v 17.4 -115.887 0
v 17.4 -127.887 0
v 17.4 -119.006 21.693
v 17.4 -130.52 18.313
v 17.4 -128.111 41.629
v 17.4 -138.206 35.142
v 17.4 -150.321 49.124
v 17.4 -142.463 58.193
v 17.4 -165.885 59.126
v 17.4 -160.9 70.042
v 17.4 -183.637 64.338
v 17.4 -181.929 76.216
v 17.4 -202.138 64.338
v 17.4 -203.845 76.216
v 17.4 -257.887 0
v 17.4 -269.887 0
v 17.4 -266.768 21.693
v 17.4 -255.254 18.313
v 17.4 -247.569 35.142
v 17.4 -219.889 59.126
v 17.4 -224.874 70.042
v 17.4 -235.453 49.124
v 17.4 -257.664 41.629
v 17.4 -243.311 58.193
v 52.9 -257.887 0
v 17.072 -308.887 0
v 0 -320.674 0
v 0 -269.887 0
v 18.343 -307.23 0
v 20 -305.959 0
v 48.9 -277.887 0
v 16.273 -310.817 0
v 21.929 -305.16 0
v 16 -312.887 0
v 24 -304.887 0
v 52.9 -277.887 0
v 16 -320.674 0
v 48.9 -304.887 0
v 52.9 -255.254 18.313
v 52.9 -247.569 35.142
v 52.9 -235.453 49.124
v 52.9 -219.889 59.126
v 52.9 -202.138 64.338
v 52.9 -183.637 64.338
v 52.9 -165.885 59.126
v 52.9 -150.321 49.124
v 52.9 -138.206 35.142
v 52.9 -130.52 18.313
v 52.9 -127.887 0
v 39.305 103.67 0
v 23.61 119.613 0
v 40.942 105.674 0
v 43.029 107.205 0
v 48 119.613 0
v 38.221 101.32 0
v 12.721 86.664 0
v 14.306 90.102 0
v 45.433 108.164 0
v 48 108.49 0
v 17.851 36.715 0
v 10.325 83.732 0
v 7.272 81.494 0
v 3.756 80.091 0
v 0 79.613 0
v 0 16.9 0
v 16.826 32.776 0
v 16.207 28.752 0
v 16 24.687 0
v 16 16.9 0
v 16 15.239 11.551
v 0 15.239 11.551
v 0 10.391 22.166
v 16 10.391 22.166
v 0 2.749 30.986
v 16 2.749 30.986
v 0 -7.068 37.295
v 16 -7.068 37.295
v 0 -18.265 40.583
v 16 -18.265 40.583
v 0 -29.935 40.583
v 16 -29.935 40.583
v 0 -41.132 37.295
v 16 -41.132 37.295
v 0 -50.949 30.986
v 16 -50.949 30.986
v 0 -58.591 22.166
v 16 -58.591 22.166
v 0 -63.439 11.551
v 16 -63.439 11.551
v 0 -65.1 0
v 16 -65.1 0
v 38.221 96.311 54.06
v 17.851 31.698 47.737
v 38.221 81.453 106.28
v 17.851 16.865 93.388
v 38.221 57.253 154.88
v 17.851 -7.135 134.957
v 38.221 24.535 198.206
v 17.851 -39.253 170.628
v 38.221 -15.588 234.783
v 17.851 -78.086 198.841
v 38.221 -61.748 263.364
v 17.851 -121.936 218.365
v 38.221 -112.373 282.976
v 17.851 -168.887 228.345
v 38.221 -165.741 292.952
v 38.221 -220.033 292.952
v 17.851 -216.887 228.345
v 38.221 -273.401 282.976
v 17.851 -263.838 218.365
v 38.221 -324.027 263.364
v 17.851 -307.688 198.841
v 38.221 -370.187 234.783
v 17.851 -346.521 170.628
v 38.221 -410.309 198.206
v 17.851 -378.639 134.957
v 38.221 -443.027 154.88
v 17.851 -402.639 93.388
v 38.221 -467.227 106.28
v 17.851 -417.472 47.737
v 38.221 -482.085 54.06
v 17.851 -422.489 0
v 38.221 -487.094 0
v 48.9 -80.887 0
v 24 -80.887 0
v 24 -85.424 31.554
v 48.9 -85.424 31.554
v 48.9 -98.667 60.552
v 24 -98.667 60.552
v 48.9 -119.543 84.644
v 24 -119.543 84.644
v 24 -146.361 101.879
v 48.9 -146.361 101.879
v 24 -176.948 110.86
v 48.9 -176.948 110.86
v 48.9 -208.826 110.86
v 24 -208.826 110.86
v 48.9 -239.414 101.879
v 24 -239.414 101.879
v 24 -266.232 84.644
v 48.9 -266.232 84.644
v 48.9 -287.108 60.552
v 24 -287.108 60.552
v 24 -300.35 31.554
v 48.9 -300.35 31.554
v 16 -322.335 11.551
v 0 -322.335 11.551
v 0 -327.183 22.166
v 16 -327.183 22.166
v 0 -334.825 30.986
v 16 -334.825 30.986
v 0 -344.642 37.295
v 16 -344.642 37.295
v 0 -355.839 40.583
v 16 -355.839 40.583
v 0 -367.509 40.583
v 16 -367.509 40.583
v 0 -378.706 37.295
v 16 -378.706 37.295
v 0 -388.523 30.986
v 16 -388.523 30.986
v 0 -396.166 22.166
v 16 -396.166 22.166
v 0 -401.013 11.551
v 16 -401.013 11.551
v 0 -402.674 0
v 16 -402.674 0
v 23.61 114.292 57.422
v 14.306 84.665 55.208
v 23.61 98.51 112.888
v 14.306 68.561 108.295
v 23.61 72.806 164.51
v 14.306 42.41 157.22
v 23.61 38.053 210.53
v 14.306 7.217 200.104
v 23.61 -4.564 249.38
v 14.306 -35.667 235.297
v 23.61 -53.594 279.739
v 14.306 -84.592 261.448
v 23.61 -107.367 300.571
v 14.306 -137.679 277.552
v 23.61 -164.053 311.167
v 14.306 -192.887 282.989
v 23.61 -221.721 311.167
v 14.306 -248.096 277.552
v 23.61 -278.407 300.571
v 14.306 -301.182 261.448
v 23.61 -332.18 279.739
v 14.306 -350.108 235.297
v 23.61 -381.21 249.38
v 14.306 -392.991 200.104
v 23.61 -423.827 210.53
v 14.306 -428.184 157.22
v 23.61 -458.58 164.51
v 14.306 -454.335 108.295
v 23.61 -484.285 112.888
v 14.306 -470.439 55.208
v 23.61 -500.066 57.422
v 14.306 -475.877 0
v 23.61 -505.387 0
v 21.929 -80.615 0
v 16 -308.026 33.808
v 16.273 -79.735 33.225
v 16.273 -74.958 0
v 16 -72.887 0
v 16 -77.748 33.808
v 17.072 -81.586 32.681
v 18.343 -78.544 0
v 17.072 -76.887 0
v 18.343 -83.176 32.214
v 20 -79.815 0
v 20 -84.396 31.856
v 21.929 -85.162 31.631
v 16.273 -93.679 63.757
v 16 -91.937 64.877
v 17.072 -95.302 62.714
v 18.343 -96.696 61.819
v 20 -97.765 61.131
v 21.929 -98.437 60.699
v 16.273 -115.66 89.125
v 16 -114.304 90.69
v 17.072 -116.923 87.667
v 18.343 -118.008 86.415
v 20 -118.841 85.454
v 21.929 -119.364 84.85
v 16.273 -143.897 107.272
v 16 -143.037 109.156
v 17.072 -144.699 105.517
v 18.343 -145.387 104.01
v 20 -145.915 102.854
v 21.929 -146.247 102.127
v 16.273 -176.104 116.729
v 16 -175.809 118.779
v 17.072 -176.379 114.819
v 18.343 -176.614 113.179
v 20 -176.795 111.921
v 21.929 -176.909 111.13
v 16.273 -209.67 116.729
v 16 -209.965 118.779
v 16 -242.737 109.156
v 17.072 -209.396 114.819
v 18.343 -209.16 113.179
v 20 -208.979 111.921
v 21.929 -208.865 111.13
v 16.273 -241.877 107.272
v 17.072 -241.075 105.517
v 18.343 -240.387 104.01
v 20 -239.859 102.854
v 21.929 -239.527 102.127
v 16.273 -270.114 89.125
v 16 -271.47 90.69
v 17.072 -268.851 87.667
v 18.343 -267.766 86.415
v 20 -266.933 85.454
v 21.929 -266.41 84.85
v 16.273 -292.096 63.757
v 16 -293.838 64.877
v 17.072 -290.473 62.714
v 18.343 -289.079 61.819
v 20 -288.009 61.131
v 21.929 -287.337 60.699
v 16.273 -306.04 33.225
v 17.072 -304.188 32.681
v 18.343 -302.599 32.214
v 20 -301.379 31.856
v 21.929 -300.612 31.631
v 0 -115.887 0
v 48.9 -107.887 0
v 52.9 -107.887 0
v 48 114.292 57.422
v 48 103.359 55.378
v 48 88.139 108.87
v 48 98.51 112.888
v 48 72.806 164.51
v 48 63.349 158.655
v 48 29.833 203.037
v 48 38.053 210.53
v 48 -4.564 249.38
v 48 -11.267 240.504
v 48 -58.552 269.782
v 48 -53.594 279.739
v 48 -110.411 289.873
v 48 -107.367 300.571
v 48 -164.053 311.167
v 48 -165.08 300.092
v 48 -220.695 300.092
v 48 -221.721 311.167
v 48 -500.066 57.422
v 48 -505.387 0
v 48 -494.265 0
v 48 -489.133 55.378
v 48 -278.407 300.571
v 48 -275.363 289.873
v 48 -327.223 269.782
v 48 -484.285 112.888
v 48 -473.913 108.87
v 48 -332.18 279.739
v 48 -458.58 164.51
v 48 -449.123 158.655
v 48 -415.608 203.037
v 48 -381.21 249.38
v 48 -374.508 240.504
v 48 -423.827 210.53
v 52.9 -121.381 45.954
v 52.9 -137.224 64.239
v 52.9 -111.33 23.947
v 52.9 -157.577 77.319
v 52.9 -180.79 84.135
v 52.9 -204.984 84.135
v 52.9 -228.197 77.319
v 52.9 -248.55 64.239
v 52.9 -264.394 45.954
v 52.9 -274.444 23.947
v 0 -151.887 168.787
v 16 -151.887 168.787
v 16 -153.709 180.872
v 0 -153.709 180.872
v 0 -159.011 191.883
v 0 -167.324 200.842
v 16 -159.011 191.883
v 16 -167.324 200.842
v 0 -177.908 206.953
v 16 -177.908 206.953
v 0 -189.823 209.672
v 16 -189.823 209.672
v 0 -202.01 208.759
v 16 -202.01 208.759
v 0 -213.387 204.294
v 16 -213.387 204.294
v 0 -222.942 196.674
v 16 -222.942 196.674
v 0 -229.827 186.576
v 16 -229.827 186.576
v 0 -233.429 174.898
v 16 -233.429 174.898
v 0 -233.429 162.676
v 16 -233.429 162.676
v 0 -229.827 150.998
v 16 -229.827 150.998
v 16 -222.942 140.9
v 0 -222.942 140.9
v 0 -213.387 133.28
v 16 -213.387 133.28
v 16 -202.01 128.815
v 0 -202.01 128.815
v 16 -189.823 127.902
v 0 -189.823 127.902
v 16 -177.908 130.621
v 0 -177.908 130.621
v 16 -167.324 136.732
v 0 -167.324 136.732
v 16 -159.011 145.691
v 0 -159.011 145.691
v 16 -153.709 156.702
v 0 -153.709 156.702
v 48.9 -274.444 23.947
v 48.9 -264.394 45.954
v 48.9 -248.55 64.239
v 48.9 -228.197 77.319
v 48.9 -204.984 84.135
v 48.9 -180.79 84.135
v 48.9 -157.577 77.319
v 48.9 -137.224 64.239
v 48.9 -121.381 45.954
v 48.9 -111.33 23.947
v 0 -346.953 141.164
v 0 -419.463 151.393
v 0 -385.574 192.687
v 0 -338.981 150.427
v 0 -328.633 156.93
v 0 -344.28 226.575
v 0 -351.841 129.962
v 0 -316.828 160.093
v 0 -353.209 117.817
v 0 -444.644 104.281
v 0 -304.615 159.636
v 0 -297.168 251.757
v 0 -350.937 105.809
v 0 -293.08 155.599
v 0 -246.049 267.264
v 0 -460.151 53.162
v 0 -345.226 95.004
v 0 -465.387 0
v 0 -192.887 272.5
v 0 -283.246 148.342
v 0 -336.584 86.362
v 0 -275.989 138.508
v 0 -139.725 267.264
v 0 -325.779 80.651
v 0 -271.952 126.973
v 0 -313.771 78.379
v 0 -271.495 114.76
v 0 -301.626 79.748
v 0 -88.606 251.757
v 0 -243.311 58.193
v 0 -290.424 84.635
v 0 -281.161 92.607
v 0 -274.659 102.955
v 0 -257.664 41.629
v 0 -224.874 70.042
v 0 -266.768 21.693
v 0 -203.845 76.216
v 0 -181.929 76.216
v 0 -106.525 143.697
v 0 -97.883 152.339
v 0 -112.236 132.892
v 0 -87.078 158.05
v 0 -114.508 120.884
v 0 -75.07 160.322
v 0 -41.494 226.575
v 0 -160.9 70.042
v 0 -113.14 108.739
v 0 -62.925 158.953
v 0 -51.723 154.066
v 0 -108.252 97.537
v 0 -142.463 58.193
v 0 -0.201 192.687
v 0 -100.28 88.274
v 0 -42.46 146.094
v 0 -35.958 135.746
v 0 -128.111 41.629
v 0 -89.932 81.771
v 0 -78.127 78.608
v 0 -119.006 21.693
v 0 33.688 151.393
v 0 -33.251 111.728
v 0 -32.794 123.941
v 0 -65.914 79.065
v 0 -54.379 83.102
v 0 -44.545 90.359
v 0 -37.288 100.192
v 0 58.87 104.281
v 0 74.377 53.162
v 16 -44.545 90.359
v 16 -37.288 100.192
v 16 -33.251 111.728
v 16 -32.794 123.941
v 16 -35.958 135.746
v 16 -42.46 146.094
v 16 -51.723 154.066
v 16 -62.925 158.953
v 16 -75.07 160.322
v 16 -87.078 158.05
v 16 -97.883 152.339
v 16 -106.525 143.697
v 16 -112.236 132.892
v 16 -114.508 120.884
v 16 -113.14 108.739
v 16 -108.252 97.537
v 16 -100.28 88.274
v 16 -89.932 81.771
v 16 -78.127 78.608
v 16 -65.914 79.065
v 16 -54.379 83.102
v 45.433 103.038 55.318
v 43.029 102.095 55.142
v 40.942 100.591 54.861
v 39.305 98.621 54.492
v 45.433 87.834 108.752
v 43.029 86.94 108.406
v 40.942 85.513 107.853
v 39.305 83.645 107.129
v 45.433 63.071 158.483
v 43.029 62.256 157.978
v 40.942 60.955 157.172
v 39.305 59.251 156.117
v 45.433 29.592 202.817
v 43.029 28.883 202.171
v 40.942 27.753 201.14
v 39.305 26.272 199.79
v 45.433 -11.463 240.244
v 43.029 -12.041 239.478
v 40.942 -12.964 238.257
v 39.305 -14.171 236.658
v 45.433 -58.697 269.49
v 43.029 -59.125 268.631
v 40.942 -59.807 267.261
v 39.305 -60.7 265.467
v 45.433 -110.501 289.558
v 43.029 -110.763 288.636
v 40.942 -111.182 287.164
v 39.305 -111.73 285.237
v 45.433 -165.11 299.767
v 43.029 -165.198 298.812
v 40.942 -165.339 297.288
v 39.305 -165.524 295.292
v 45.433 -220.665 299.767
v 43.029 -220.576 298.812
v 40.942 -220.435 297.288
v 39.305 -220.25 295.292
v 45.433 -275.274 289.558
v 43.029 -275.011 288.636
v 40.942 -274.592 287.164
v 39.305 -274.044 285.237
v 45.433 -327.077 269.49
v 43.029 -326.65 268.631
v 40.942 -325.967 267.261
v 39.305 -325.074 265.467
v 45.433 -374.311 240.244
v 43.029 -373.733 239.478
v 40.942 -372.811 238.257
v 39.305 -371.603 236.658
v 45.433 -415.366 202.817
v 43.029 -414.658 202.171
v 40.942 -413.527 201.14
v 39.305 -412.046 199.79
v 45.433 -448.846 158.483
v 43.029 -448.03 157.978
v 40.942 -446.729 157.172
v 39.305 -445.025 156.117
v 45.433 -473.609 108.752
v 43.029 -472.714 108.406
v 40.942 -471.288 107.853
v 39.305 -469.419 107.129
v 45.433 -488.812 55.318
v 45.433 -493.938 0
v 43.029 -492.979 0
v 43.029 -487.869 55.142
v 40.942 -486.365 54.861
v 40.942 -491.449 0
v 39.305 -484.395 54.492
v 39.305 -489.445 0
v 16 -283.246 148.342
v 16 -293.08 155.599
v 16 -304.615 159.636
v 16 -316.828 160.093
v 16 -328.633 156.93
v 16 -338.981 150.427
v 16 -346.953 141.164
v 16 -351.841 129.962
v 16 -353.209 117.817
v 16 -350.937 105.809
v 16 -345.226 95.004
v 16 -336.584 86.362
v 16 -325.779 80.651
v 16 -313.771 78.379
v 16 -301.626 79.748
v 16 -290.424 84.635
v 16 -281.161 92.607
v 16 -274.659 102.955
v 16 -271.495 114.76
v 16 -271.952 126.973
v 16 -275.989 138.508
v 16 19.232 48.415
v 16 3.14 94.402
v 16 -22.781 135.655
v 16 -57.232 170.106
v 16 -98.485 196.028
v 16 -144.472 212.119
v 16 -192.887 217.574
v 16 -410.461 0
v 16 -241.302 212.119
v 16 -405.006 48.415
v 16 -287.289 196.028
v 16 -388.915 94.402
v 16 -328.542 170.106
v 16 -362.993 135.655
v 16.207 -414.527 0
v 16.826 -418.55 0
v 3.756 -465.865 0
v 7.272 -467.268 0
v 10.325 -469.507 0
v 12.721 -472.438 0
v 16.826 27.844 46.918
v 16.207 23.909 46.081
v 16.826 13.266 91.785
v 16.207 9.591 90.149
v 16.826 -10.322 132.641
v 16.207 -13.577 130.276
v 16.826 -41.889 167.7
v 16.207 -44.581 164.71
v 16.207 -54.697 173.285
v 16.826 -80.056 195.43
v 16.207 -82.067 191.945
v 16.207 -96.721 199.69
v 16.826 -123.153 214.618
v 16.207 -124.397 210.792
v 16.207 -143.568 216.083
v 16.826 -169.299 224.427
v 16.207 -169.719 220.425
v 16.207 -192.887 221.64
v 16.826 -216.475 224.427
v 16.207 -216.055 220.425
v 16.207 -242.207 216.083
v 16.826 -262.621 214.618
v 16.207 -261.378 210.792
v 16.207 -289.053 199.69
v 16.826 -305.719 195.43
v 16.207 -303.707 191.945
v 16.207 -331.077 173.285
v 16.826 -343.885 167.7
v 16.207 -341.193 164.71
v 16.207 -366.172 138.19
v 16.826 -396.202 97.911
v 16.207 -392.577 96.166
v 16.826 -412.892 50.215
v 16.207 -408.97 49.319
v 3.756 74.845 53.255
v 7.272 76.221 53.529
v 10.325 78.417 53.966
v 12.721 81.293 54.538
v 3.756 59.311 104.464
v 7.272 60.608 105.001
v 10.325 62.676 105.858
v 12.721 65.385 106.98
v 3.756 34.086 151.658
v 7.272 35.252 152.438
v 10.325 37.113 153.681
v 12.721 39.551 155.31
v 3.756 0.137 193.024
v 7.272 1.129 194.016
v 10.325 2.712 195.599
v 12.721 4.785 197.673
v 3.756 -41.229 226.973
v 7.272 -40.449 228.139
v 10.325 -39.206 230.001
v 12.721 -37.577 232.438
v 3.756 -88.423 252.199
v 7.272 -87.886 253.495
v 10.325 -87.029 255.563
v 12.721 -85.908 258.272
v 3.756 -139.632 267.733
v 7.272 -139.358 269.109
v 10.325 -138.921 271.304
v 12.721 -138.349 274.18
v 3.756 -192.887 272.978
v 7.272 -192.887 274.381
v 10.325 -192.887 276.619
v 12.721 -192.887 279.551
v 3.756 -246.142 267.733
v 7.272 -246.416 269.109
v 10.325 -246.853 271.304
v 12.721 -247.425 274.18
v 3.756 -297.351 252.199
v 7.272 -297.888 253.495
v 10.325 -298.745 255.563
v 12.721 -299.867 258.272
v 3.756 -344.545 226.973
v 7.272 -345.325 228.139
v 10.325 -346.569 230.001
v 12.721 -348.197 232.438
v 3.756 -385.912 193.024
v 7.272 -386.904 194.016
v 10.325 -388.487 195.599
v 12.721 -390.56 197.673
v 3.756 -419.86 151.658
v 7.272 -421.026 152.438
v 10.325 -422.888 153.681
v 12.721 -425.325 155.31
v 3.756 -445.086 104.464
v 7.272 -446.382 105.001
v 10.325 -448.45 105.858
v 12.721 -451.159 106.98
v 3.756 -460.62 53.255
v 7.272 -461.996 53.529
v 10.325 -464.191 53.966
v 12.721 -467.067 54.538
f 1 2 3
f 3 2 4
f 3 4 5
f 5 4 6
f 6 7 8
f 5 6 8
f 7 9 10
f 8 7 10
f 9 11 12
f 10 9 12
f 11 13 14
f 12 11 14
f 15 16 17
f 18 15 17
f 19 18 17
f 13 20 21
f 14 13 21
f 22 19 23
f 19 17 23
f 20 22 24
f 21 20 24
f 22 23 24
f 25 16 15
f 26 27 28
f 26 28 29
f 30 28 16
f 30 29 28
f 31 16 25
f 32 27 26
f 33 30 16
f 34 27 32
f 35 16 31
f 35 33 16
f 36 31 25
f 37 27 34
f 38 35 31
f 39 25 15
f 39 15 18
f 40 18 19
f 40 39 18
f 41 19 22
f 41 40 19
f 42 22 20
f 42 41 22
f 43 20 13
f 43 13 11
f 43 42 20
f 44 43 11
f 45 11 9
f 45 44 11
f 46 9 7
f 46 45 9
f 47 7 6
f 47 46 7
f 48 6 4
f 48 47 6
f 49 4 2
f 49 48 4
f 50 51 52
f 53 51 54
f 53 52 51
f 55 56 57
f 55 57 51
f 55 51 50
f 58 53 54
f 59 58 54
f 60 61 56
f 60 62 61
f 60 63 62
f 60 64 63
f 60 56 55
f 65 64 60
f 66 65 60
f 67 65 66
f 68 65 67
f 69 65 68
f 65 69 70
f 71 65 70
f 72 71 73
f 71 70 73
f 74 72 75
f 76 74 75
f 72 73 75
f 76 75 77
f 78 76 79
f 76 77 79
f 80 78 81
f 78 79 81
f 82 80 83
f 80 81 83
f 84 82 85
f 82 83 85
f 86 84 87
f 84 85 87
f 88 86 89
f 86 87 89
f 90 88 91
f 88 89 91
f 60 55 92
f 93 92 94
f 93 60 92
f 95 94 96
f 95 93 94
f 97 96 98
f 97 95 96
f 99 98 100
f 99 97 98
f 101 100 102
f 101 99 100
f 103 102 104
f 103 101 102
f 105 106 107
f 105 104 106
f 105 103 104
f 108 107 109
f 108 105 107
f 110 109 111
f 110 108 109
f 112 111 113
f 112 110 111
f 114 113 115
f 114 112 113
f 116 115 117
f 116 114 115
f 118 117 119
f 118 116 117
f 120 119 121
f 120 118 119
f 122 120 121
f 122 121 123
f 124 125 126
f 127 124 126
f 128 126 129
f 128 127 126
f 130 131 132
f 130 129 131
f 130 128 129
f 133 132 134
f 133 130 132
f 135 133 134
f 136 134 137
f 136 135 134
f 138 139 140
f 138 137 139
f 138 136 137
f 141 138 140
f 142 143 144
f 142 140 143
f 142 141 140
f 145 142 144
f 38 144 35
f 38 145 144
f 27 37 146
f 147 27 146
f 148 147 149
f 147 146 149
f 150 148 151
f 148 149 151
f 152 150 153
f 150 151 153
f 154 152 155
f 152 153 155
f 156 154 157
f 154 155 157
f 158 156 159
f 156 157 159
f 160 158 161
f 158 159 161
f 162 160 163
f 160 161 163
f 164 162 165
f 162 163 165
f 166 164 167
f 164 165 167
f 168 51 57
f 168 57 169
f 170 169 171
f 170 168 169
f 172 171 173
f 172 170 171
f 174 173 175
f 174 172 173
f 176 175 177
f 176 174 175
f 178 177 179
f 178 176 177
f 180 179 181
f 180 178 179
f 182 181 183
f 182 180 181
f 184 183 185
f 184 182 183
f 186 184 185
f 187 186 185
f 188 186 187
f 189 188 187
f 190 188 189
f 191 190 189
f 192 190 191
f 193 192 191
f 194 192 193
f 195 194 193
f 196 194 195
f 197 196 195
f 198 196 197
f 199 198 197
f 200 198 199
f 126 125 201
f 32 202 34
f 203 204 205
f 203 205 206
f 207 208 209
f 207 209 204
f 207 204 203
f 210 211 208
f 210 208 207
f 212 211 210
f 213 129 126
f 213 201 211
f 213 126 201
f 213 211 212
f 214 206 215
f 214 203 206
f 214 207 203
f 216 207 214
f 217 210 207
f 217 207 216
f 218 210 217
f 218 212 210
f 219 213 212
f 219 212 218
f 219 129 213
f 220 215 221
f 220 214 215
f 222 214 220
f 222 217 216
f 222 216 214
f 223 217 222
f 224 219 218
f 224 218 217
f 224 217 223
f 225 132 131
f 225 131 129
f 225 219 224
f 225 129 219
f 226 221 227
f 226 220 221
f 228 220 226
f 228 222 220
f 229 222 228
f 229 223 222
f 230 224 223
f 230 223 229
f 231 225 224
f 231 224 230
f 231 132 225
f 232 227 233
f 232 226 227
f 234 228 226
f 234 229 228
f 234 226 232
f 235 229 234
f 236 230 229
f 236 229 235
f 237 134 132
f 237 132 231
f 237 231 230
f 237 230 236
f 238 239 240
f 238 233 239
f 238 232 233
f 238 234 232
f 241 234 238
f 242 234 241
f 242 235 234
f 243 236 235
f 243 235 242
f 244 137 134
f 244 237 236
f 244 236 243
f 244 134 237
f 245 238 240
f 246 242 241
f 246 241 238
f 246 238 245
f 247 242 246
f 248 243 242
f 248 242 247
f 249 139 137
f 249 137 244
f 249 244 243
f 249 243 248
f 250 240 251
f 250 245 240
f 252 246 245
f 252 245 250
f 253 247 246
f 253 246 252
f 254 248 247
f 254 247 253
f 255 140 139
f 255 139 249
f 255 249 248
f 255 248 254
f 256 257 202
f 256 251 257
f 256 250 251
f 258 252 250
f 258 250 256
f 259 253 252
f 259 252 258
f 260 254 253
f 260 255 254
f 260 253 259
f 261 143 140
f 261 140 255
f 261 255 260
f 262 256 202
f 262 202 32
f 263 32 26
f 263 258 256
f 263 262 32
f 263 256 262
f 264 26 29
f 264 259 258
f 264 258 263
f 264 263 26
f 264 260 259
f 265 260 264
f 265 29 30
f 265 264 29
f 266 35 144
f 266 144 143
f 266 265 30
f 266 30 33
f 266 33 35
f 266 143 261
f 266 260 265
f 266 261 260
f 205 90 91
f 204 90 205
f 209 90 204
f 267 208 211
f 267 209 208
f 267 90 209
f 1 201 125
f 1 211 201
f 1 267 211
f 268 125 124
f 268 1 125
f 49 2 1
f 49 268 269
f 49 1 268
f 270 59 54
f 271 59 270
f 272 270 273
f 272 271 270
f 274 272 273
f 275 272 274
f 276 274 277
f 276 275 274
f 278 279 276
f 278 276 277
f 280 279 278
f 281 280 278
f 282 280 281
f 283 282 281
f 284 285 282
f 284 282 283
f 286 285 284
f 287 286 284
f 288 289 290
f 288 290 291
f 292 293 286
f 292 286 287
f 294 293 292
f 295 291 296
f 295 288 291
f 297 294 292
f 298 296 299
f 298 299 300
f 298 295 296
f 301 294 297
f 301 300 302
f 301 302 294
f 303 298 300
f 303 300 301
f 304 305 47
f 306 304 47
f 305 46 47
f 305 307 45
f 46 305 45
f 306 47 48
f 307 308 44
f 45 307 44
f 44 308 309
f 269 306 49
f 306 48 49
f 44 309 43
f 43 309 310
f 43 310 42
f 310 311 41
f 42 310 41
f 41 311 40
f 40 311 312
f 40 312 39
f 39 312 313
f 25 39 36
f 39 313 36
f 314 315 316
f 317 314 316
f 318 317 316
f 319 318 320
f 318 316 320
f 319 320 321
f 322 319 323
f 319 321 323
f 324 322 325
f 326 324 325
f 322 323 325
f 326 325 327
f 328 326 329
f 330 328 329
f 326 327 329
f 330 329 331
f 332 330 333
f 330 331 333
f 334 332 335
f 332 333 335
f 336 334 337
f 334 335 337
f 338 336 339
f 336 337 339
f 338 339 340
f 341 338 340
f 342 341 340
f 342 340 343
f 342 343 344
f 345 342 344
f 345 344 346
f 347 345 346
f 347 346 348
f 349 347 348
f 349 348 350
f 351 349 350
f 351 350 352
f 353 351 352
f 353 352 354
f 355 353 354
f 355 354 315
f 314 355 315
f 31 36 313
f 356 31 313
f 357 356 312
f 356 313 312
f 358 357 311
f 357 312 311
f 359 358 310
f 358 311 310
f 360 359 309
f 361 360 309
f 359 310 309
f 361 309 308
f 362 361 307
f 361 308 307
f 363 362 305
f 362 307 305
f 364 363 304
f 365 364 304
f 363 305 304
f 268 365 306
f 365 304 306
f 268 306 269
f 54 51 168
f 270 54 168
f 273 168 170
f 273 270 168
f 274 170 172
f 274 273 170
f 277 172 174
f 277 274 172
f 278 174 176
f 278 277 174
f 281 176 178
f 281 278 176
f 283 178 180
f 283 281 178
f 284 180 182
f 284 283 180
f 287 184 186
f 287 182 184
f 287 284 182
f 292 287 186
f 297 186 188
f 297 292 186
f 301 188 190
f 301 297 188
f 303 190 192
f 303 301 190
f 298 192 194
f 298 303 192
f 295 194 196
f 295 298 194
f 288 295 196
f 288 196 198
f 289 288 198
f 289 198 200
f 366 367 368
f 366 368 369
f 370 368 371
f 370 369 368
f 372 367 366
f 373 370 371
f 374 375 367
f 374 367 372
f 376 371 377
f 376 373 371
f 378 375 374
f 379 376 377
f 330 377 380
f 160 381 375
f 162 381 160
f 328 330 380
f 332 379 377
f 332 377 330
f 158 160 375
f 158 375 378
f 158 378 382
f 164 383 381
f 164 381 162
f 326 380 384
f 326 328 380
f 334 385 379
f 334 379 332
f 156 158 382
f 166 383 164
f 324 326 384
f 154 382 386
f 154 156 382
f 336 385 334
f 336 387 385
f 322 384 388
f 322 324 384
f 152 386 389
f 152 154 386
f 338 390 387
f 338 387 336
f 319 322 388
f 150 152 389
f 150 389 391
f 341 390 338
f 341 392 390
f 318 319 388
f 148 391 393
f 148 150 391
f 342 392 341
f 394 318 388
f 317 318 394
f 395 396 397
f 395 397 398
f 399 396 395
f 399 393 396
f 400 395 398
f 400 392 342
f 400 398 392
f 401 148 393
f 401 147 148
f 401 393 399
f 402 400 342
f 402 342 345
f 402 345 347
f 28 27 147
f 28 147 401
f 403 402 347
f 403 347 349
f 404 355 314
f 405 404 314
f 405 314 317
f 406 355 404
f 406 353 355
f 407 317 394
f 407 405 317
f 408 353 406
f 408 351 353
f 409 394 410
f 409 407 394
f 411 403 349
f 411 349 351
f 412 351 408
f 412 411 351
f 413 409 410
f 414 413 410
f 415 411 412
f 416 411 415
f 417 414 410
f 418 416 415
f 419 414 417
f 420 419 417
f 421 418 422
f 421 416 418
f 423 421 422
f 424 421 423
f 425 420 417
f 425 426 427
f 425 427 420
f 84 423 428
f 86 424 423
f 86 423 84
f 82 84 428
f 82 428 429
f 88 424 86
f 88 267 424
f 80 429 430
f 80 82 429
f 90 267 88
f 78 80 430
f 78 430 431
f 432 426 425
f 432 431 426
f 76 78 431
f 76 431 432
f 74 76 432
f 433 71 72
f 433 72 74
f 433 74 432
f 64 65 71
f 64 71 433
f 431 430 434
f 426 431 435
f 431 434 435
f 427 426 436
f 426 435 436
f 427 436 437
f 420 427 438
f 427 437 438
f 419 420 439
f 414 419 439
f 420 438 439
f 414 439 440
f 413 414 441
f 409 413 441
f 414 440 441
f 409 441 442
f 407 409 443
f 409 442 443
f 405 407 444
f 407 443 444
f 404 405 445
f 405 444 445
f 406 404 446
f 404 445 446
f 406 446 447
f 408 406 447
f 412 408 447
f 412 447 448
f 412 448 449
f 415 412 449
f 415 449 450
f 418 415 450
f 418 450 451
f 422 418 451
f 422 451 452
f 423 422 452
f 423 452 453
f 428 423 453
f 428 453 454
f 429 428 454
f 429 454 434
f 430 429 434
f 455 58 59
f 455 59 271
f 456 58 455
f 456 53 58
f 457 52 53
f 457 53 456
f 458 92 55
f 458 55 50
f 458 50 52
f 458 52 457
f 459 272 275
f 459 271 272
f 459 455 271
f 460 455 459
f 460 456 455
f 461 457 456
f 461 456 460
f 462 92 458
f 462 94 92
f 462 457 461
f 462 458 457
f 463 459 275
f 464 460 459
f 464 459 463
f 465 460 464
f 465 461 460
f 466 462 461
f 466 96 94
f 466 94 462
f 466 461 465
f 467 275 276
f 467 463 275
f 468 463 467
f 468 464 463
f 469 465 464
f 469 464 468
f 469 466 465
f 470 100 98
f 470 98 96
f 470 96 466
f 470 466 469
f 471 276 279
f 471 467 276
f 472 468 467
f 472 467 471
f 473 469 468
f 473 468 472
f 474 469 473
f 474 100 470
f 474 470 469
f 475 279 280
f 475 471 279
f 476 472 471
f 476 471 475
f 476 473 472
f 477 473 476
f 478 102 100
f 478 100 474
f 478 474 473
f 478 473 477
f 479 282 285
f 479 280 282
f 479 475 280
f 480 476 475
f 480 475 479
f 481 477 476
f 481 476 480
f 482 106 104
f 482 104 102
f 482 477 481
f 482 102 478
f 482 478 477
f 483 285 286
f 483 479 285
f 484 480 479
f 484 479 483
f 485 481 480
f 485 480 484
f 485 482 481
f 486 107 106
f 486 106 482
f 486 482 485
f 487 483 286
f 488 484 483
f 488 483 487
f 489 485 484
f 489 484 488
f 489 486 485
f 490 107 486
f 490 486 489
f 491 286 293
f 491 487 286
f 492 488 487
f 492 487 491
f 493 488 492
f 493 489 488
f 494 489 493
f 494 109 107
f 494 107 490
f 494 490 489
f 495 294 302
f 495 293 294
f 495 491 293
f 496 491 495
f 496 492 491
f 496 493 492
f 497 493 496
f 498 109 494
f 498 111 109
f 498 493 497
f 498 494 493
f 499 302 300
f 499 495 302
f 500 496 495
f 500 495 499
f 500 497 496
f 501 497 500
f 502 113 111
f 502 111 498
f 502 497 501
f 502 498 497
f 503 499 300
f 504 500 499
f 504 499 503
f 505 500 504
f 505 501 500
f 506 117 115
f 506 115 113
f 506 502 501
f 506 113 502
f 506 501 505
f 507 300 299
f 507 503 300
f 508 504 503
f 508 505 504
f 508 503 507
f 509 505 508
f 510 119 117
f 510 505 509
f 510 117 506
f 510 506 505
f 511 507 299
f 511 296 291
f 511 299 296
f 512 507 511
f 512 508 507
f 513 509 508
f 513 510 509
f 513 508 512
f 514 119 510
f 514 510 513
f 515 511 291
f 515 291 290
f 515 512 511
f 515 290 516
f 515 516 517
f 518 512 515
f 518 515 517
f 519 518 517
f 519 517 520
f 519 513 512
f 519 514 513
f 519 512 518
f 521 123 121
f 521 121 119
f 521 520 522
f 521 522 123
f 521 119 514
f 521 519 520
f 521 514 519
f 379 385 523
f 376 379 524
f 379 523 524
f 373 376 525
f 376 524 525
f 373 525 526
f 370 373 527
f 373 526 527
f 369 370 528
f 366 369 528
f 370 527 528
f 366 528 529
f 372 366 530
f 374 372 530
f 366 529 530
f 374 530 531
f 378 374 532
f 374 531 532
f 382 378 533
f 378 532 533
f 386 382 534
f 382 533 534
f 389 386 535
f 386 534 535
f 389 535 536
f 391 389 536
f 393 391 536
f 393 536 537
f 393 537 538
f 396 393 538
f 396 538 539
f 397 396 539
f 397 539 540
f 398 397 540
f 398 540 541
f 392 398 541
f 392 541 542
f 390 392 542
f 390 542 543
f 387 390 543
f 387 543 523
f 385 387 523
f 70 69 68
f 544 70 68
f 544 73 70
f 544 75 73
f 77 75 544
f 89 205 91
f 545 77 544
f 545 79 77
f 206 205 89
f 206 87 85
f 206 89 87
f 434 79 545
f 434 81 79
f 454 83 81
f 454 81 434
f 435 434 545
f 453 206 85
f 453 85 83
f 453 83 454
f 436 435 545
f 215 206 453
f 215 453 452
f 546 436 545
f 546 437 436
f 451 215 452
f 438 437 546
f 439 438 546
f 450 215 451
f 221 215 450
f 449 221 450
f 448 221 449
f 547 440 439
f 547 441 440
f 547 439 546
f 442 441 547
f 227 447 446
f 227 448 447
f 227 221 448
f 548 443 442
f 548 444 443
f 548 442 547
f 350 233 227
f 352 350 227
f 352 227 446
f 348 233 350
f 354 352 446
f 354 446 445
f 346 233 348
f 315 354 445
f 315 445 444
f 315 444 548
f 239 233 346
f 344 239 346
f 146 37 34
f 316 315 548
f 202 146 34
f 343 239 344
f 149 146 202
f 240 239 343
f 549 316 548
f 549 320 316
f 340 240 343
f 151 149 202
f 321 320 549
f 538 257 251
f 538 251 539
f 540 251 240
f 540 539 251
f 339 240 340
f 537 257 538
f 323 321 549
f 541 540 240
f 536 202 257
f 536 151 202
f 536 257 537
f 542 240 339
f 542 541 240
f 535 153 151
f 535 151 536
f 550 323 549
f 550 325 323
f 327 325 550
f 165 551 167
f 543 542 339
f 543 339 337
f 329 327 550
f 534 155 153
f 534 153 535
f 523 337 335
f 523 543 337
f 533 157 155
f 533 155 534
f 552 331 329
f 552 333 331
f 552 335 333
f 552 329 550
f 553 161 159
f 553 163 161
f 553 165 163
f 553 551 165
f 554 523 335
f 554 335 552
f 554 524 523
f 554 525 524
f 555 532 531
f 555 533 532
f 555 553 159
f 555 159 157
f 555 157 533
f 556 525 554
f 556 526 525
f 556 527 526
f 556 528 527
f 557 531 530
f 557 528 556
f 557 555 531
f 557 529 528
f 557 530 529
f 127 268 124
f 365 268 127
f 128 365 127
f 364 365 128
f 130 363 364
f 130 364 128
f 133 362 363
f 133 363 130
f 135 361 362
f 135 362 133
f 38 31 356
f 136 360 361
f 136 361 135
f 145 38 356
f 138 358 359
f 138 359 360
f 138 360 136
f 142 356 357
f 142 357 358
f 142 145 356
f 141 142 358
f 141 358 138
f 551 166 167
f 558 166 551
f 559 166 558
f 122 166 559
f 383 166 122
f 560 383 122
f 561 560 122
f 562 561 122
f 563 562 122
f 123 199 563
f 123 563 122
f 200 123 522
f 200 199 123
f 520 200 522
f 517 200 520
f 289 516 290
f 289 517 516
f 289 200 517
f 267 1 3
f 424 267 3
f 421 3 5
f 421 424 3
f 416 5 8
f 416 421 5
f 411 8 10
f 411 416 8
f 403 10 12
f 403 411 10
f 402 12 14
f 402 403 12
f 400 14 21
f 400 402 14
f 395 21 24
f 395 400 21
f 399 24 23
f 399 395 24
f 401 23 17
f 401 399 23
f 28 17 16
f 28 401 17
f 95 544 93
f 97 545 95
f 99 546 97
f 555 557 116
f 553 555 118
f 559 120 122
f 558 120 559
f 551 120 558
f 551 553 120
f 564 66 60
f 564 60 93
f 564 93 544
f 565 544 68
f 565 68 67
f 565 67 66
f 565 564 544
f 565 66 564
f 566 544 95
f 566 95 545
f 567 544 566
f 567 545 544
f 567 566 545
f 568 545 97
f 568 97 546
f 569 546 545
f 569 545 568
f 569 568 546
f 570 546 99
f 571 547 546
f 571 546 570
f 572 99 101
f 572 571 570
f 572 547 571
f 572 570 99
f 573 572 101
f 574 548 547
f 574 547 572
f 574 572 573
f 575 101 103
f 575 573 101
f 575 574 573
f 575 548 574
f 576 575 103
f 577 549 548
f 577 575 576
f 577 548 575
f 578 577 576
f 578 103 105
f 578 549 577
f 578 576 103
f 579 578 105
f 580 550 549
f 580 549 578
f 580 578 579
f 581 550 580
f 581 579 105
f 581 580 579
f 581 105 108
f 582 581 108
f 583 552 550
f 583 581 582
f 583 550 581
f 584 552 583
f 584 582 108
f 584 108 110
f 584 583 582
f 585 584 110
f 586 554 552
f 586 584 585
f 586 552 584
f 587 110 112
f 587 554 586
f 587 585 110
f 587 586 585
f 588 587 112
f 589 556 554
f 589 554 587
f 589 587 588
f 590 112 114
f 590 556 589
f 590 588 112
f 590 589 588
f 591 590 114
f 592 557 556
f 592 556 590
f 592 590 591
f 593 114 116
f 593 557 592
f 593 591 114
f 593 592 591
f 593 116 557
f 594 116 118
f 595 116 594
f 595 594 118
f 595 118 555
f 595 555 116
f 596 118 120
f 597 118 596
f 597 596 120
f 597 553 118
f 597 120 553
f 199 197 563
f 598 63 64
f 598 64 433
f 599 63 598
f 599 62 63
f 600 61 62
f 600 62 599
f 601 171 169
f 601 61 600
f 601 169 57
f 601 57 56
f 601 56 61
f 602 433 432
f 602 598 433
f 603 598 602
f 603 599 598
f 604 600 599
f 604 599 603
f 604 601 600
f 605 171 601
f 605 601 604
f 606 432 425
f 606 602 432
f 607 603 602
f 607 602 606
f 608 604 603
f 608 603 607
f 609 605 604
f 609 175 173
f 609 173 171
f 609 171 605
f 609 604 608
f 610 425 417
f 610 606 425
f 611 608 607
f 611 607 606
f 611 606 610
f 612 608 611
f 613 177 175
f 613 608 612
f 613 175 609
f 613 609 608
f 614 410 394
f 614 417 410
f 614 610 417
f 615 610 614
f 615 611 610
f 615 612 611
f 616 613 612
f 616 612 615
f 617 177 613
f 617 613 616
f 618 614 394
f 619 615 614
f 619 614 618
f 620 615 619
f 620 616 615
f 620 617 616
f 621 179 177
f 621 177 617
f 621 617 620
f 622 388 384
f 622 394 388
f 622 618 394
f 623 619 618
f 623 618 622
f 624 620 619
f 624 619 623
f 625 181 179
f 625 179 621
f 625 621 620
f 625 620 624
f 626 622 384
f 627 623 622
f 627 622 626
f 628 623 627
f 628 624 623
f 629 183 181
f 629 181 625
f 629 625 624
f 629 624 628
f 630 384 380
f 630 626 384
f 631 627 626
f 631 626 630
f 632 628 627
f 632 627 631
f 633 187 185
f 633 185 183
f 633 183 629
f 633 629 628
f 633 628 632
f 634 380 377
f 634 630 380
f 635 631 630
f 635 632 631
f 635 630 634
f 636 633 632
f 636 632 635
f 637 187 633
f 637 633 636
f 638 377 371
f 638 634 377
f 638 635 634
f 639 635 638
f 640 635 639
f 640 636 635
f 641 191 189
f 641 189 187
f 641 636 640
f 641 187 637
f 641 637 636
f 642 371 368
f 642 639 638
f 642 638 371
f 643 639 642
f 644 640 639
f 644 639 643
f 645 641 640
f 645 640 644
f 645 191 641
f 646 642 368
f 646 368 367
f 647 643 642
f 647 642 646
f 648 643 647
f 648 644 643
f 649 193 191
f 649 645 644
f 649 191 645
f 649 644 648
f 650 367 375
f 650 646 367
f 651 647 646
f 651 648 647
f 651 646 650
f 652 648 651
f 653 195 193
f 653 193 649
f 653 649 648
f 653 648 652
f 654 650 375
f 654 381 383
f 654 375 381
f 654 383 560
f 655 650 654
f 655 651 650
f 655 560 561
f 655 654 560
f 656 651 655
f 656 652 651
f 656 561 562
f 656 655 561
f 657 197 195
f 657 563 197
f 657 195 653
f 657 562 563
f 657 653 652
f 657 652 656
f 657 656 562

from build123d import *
from build123d.topology import SkipClean

# Parameters (mm, degrees)
FORO_START              = 60
SKETCH2_R               = 41
FORO_DEPTH              = 120
PATTERNFORI_COUNT       = 8
CUT_EXTRUDE1_DEPTH      = 597.549083718
CUT_EXTRUDE1_DEPTH_BACK = 597.549083718
SKETCH4_W               = 165.941621871
SKETCH4_H               = 884.81830511
CUT_EXTRUDE2_DEPTH      = 597.549083718
CUT_EXTRUDE2_DEPTH_BACK = 597.549083718
SKETCH5_W               = 398.645637441
SKETCH5_H               = 571.659634656


with BuildPart() as part:
    # Sketch1 → Puleggia (revolve)
    with BuildSketch(Plane.XY):
        with BuildLine():
            Line((14.305754261, 90.102284872), (23.610406599, 119.612871865))
            Line((23.610406599, 119.612871865), (48, 119.612871865))
            Line((48, 119.612871865), (48, 108.49032691))
            ThreePointArc((48, 108.49032691), (41.937089486, 106.505733817), (38.221197059, 101.320211941))
            Line((38.221197059, 101.320211941), (17.85132197, 36.715221983))
            ThreePointArc((17.85132197, 36.715221983), (16.465539581, 30.77192545), (16, 24.686990003))
            Line((16, 24.686990003), (16, -72.887128135))
            ThreePointArc((16, -72.887128135), (18.343145751, -78.543982385), (24, -80.887128135))
            Line((24, -80.887128135), (48.9, -80.887128135))
            Line((48.9, -80.887128135), (48.9, -115.887128135))
            Line((48.9, -115.887128135), (0, -115.887128135))
            Line((0, -115.887128135), (0, 79.612871865))
            ThreePointArc((0, 79.612871865), (8.869644725, 82.516202801), (14.305754261, 90.102284872))
        make_face()
    puleggia = revolve(axis=Axis((-62.254886415, -192.887128135, 0), (1, 0, 0)))

    # Mirror 2: Puleggia across plane
    with SkipClean():  # the faces are left unmerged after this step: merging them gives an invalid solid
        add(puleggia.mirror(Plane(origin=(0, 79.612871865, 0), x_dir=(0, 0, 1), z_dir=(1, 0, 0))))

    # Sketch2 → Foro (cut)
    with SkipClean():  # the faces are left unmerged after this step: merging them gives an invalid solid
        with BuildSketch(Plane(origin=(0, 0, 0), x_dir=(0, 0, -1), z_dir=(1, 0, 0)).offset(FORO_START)):
            with Locations((0, -24.100069066)):
                Circle(SKETCH2_R)
        foro = extrude(amount=-FORO_DEPTH, mode=Mode.SUBTRACT)

    # PatternFori: Foro ×8 about axis
    with SkipClean():  # the faces are left unmerged after this step: merging them gives an invalid solid
        patternfori_axis = Axis((48.9, -192.887128135, 0), (-1, 0, 0))
        for i in range(1, PATTERNFORI_COUNT):
            add(foro.rotate(patternfori_axis, i * 360 / PATTERNFORI_COUNT), mode=Mode.SUBTRACT)

    # Sketch3 → Revolve1 (revolve)
    with SkipClean():  # the faces are left unmerged after this step: merging them gives an invalid solid
        with BuildSketch(Plane.XY):
            Polygon((48.9, -115.887128135), (48.9, -107.887128135), (52.9, -107.887128135), (52.9, -127.887128135), (48.203298426, -127.887128135), (17.4, -127.887128135), (17.4, -115.887128135), align=None)
        revolve1 = revolve(axis=Axis((48.9, -192.887128135, 0), (-1, 0, 0)))

    # Mirror1: Revolve1 across plane
    with SkipClean():  # the faces are left unmerged after this step: merging them gives an invalid solid
        add(revolve1.mirror(Plane(origin=(0, 0, 0), x_dir=(0, 0, 1), z_dir=(1, 0, 0))))

    # Sketch4 → Cut-Extrude1 (cut, two sides: drawn at the far end of the back side and taken through both)
    with BuildSketch(Plane.XY.offset(-CUT_EXTRUDE1_DEPTH_BACK)):
        with Locations((-82.970810936, -207.065039304)):
            Rectangle(SKETCH4_W, SKETCH4_H)
    extrude(amount=CUT_EXTRUDE1_DEPTH + CUT_EXTRUDE1_DEPTH_BACK, mode=Mode.SUBTRACT)

    # Sketch5 → Cut-Extrude2 (cut, two sides: drawn at the far end of the back side and taken through both)
    with BuildSketch(Plane(origin=(0, 0, 0), x_dir=(1, 0, 0), z_dir=(0, 1, 0)).offset(-CUT_EXTRUDE2_DEPTH_BACK)):
        with Locations((15.58753589, 285.829817328)):
            Rectangle(SKETCH5_W, SKETCH5_H)
    extrude(amount=CUT_EXTRUDE2_DEPTH + CUT_EXTRUDE2_DEPTH_BACK, mode=Mode.SUBTRACT)


solid = part.part
